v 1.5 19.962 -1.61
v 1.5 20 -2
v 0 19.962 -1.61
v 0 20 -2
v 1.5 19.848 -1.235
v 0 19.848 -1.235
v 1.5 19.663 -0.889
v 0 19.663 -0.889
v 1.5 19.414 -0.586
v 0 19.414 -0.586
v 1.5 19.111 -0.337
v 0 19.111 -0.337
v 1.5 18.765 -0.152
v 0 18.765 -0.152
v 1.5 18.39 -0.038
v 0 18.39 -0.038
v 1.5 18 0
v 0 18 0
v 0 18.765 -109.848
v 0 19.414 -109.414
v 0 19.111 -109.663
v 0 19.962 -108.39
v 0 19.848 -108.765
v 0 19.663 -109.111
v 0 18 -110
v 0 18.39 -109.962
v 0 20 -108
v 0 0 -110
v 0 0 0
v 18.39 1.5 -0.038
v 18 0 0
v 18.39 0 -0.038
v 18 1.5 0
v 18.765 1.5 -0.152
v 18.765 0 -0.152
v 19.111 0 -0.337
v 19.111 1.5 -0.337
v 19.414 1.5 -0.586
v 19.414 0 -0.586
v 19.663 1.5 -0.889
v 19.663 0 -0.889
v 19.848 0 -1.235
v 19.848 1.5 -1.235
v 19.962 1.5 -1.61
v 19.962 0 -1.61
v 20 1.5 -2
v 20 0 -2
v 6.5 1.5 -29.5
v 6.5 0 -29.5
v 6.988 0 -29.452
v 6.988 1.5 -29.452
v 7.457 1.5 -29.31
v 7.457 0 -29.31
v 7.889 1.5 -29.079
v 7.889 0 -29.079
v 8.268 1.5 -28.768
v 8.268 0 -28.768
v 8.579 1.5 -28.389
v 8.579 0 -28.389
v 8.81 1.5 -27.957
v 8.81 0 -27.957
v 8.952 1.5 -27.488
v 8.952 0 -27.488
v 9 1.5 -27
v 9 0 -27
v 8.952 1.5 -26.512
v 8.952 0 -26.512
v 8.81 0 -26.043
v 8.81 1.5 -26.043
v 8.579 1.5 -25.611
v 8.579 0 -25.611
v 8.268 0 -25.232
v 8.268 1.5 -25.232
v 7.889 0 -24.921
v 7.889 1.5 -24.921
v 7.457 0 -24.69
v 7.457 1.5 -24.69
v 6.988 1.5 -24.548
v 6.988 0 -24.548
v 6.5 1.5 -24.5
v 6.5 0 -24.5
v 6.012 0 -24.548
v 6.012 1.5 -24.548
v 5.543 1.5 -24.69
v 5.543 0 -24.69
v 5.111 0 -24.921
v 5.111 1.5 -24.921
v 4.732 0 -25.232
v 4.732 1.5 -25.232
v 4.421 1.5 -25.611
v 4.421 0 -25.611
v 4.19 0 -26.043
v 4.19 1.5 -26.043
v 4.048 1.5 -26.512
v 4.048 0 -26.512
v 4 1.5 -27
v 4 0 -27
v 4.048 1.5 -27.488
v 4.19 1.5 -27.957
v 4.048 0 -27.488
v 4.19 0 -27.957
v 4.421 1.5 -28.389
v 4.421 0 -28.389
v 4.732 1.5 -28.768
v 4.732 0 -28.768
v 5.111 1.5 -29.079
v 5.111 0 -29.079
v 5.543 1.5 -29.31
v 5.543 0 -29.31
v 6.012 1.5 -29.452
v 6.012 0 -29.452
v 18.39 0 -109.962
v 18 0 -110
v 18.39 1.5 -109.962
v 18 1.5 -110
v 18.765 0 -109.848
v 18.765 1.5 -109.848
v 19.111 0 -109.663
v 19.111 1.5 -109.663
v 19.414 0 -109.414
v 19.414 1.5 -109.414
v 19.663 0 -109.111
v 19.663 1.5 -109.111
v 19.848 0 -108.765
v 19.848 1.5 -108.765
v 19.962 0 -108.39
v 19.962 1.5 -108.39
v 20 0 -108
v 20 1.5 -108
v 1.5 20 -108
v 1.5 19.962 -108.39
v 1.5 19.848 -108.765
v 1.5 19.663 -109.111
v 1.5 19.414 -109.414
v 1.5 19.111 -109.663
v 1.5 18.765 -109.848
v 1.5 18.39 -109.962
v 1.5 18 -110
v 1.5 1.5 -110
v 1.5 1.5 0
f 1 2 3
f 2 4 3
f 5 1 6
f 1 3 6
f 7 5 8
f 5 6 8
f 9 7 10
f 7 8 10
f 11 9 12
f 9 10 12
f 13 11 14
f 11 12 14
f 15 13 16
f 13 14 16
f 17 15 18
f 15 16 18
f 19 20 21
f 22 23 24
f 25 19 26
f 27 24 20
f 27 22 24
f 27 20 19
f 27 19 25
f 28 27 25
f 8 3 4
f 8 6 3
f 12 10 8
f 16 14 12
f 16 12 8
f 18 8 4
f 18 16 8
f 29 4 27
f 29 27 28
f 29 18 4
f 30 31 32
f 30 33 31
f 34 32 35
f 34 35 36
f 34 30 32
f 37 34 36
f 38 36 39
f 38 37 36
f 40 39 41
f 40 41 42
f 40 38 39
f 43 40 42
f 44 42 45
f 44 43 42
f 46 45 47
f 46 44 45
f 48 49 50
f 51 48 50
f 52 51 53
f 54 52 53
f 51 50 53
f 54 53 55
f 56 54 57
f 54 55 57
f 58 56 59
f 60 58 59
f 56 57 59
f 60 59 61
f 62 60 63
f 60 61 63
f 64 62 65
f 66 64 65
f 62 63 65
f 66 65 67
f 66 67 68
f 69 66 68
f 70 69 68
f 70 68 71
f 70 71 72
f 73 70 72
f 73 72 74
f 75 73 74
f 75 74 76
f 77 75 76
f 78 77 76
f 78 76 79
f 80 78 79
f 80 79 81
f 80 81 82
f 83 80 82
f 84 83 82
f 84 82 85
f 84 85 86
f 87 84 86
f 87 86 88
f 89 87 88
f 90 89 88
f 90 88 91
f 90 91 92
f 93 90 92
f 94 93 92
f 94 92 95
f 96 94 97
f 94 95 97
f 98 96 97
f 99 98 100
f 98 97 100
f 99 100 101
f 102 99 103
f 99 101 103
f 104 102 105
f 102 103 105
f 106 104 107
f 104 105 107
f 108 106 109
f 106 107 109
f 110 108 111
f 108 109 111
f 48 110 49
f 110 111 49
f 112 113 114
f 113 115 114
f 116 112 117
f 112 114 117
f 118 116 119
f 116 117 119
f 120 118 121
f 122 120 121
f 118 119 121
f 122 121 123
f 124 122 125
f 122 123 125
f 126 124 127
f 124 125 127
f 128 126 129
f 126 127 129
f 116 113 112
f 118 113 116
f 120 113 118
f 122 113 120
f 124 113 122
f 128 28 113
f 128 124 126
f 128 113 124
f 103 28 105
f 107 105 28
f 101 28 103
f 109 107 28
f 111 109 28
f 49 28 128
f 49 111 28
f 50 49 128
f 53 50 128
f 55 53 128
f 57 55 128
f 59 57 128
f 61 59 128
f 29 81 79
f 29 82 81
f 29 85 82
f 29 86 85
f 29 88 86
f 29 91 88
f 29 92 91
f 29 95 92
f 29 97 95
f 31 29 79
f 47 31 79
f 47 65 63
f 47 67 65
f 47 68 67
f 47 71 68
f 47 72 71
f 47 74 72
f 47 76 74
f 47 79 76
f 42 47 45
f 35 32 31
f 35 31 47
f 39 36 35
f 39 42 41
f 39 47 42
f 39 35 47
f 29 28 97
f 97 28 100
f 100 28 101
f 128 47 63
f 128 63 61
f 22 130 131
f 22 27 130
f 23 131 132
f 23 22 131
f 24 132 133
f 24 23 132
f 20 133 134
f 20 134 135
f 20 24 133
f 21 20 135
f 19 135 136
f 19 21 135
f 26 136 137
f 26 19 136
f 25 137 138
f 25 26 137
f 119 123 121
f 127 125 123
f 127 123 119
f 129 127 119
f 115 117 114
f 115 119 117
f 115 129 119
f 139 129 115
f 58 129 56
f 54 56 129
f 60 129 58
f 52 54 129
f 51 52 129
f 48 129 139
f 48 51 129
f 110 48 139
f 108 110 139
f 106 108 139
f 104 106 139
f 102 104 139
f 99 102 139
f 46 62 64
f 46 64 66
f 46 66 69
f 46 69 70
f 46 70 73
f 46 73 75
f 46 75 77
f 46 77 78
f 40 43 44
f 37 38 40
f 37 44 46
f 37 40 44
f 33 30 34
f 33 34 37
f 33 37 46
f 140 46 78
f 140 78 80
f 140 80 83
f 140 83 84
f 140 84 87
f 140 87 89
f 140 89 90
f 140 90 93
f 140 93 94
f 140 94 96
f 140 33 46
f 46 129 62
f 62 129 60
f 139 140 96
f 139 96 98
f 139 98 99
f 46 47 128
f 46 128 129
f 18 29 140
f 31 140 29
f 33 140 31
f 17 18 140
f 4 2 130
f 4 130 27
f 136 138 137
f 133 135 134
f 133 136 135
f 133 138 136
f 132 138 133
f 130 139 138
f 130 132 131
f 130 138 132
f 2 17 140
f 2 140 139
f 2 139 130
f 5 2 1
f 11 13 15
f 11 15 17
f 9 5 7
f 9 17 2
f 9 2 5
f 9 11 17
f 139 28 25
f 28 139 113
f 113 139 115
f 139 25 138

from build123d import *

# Parameters (mm, degrees)
LINEAR_AUSTRAGEN_D_NN1_DEPTH    = 110
SKIZZE2_R                       = 2.5
SCHNITT_LINEAR_AUSTRAGEN1_DEPTH = 17
VERRUNDUNG1_R                   = 2


with BuildPart() as part:
    # Skizze1 → Linear-Austragen-Dünn1 (new body)
    with BuildSketch(Plane.XY):
        Polygon((0, 20), (0, 0), (20, 0), (20, 1.5), (1.5, 1.5), (1.5, 20), align=None)
    extrude(amount=-LINEAR_AUSTRAGEN_D_NN1_DEPTH)

    # Skizze2 → Schnitt-Linear austragen1 (cut)
    with BuildSketch(Plane.XZ):
        with Locations(Location((6.5, -27, 0), (0, 0, 270))):
            Circle(SKIZZE2_R)
    extrude(amount=-SCHNITT_LINEAR_AUSTRAGEN1_DEPTH, mode=Mode.SUBTRACT)

    # Verrundung1
    verrundung1_edges = [part.edges().sort_by_distance(p)[0] for p in [
        (0.75, 20, -110),
        (0.75, 20, 0),
        (20, 0.75, 0),
        (20, 0.75, -110),
    ]]
    fillet(verrundung1_edges, radius=VERRUNDUNG1_R)


solid = part.part
